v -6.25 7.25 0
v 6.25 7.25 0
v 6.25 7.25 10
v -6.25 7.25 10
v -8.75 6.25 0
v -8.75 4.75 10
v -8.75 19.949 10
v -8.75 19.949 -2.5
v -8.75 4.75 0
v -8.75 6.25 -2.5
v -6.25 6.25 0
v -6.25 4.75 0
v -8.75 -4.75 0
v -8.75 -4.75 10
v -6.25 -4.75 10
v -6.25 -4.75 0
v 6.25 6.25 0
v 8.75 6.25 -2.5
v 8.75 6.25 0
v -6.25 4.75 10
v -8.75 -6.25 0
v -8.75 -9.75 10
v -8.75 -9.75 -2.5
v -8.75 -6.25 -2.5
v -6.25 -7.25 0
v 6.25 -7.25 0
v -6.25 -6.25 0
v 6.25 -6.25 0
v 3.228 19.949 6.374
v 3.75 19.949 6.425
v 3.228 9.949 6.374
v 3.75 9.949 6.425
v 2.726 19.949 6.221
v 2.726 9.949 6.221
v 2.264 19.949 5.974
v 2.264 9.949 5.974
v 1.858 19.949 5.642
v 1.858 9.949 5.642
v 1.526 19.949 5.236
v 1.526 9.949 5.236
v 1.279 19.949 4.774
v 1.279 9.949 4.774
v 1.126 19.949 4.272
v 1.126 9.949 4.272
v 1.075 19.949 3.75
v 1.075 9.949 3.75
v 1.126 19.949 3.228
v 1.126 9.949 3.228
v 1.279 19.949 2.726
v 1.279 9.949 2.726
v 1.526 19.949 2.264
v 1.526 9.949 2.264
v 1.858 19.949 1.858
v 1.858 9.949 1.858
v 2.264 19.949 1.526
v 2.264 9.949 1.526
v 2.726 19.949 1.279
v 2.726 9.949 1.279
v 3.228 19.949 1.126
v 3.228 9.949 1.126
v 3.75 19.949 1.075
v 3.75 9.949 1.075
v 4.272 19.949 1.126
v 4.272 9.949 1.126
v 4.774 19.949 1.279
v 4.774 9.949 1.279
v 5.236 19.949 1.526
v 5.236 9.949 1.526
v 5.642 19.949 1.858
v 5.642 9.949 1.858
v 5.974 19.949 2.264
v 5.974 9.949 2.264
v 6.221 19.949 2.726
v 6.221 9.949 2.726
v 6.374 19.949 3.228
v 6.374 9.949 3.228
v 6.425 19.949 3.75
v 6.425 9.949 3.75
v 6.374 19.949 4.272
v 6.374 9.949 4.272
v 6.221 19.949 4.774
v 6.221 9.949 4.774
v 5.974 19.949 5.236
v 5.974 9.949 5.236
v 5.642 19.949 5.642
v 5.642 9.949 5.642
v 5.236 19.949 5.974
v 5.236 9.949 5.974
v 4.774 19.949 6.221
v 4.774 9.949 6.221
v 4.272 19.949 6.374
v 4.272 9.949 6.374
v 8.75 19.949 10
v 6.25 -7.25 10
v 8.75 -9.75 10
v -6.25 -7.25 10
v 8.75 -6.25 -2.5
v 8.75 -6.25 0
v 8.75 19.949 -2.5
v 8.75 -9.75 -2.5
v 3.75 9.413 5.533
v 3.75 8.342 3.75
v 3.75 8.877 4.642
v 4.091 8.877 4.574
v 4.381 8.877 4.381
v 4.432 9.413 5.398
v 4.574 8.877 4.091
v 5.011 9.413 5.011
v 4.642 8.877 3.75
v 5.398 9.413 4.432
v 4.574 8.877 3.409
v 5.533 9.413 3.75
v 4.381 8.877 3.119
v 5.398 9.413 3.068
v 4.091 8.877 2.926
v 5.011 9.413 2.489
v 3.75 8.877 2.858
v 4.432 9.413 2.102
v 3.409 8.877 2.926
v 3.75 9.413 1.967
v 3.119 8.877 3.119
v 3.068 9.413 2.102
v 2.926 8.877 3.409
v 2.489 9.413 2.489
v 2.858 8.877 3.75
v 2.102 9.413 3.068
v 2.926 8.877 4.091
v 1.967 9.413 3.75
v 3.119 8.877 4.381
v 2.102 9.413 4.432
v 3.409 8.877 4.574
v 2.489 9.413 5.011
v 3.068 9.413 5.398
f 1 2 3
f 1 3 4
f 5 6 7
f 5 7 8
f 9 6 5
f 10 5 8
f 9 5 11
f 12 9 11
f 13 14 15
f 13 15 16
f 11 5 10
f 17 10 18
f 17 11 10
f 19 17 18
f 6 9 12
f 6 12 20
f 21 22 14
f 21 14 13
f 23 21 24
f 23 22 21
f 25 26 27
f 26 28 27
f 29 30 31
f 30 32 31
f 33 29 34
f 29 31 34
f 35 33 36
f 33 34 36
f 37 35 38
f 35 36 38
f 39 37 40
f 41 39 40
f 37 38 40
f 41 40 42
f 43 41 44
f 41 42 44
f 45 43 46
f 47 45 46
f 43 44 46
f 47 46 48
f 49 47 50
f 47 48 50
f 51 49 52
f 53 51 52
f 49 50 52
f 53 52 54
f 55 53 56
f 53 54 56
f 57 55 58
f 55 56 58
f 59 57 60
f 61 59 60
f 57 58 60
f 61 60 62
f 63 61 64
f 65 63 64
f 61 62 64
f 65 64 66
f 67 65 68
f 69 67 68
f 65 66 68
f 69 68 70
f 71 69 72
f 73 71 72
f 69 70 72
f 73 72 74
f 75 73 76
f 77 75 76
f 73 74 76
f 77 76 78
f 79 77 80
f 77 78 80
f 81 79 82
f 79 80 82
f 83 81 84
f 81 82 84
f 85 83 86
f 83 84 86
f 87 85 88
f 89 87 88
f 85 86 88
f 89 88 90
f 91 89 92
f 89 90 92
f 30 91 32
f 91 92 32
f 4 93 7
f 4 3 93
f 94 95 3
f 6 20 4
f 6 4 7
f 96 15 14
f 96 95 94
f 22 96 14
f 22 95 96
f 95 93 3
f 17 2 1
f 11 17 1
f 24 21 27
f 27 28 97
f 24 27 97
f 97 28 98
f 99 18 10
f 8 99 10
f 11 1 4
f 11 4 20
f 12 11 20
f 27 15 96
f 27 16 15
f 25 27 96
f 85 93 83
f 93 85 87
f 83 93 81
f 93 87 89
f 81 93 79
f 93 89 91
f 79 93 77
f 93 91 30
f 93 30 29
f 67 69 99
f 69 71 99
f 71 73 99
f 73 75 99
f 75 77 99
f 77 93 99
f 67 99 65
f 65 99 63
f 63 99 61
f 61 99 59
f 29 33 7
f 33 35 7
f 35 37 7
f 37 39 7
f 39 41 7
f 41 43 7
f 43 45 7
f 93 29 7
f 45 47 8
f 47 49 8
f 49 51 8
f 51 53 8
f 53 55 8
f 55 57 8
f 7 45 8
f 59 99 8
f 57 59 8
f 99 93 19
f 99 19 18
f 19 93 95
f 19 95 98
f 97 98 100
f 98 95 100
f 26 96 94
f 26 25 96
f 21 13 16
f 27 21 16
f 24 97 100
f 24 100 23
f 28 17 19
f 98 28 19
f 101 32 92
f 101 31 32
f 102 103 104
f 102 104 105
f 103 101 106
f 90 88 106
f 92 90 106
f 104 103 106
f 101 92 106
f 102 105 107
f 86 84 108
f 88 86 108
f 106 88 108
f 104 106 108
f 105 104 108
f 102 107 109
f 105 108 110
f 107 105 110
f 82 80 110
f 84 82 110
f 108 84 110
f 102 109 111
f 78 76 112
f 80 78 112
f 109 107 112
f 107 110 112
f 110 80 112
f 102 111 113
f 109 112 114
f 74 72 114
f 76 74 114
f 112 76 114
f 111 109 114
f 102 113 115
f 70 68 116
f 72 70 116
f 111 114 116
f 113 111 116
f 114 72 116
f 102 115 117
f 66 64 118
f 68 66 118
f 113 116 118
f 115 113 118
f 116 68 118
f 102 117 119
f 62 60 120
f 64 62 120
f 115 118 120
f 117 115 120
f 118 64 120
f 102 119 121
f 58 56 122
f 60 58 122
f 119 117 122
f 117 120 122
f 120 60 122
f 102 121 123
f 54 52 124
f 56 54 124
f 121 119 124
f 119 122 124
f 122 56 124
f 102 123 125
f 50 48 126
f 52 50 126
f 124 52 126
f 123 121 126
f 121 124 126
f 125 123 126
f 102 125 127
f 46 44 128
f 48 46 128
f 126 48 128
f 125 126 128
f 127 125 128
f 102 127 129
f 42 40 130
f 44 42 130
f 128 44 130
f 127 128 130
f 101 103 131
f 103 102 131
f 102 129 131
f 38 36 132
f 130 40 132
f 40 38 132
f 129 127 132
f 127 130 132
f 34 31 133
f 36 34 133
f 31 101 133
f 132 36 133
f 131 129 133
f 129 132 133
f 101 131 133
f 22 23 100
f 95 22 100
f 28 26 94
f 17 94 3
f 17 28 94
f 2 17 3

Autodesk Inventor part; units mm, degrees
ref_plane "YZ Plane" through (0, 0, 0) normal (1, 0, 0) x (0, 1, 0)
ref_plane "XZ Plane" through (0, 0, 0) normal (0, 1, 0) x (-1, 0, 0)
ref_plane "XY Plane" through (0, 0, 0) normal (0, 0, 1) x (1, 0, 0)
sketch "Sketch1" plane through (0, 0, 0) normal (0, 0, 1) x (1, 0, 0)
  line L0 (-6.25, -7.25) -> (6.25, -7.25)
  line L1 (6.25, -7.25) -> (6.25, 7.25)
  line L2 (6.25, 7.25) -> (-6.25, 7.25)
  line L3 (-6.25, 7.25) -> (-6.25, -7.25)
  line L4 (-6.25, -7.25) -> (6.25, 7.25) construction
  line L5 (6.25, -7.25) -> (-6.25, 7.25) construction
  line L6 (-8.75, -9.75) -> (8.75, -9.75)
  line L7 (8.75, -9.75) -> (8.75, 9.75)
  line L8 (8.75, 9.75) -> (-8.75, 9.75)
  line L9 (-8.75, 9.75) -> (-8.75, -9.75)
  line L10 (-8.75, -9.75) -> (8.75, 9.75) construction
  line L11 (8.75, -9.75) -> (-8.75, 9.75) construction
  point P0 (0, 0)
  dimension "d0" = 12.5
  dimension "d1" = 14.5
  dimension "d2" = 17.5
  dimension "d3" = 19.5
extrude "Extrusion1" add sketch "Sketch1" along normal blind 10
sketch "Sketch2" plane through (0, 0, 0) normal (0, 0, -1) x (-1, 0, 0)
  line L0 (8.75, 9.75) -> (8.75, -9.75) projected
  line L1 (-8.75, 9.75) -> (8.75, 9.75)
  line L2 (8.75, 9.75) -> (8.75, 6.25)
  line L3 (8.75, 6.25) -> (-8.75, 6.25)
  line L4 (-8.75, 6.25) -> (-8.75, 9.75)
  line L5 (6.25, 7.25) -> (-6.25, 7.25) projected
  line L6 (-8.75, -9.75) -> (-8.75, 9.75) projected
  line L7 (-8.75, -9.75) -> (8.75, -9.75)
  line L8 (8.75, -9.75) -> (8.75, -6.25)
  line L9 (8.75, -6.25) -> (-8.75, -6.25)
  line L10 (-8.75, -6.25) -> (-8.75, -9.75)
  line L11 (-6.25, -7.25) -> (6.25, -7.25) projected
  point P0 (0, 0)
  point P1 (-8.75, -6.25)
  dimension "d6" = 1
  dimension "d7" = 1
extrude "Extrusion2" add sketch "Sketch2" along normal blind 2.5 contours L0 L3 L4 L1 | L0 L7 L6 L9
thicken "Thicken1" operation add thickness 10.199 both sides no extend neighbours no toward (0, 1, 0) faces at (-2.9167, 9.75, 5.8333)
sketch "Sketch3" plane through (-8.75, 19.949, 10) normal (0, 1, 0) x (1, 0, 0)
  line L0 (0, 12.5) -> (0, 0) projected
  line L1 (17.5, 12.5) -> (17.5, 0) projected
  point P0 (8.75, 10)
  point P1 (12.5, 6.25)
  point P2 (0, 6.25)
  dimension "d19" = 5
hole "Hole1" at (3.75, 19.949, 3.75) direction (0, -1, 0) diameter 5.35 depth 10 tip angle 118
sketch "Sketch4" plane through (-8.75, -6.25, 0) normal (-1, 0, 0) x (0, 0, 1)
  line L0 (10, -3.5) -> (10, 26.199) projected
  line L1 (0, 12.5) -> (0, 0) projected
  line L2 (10, 1.5) -> (0, 1.5)
  line L3 (0, 1.5) -> (0, 11)
  line L4 (0, 11) -> (10, 11)
  line L5 (10, 11) -> (10, 1.5)
  line L6 (-2.5, -3.5) -> (10, -3.5) projected
  point P0 (0, 6.25)
  point P1 (0, 1.5)
  dimension "d20" = 5
  dimension "d21" = 9.5
extrude "Extrusion3" cut sketch "Sketch4" against normal blind 5
properties part number "Adafruit_1528_4663-ND_House_02"
